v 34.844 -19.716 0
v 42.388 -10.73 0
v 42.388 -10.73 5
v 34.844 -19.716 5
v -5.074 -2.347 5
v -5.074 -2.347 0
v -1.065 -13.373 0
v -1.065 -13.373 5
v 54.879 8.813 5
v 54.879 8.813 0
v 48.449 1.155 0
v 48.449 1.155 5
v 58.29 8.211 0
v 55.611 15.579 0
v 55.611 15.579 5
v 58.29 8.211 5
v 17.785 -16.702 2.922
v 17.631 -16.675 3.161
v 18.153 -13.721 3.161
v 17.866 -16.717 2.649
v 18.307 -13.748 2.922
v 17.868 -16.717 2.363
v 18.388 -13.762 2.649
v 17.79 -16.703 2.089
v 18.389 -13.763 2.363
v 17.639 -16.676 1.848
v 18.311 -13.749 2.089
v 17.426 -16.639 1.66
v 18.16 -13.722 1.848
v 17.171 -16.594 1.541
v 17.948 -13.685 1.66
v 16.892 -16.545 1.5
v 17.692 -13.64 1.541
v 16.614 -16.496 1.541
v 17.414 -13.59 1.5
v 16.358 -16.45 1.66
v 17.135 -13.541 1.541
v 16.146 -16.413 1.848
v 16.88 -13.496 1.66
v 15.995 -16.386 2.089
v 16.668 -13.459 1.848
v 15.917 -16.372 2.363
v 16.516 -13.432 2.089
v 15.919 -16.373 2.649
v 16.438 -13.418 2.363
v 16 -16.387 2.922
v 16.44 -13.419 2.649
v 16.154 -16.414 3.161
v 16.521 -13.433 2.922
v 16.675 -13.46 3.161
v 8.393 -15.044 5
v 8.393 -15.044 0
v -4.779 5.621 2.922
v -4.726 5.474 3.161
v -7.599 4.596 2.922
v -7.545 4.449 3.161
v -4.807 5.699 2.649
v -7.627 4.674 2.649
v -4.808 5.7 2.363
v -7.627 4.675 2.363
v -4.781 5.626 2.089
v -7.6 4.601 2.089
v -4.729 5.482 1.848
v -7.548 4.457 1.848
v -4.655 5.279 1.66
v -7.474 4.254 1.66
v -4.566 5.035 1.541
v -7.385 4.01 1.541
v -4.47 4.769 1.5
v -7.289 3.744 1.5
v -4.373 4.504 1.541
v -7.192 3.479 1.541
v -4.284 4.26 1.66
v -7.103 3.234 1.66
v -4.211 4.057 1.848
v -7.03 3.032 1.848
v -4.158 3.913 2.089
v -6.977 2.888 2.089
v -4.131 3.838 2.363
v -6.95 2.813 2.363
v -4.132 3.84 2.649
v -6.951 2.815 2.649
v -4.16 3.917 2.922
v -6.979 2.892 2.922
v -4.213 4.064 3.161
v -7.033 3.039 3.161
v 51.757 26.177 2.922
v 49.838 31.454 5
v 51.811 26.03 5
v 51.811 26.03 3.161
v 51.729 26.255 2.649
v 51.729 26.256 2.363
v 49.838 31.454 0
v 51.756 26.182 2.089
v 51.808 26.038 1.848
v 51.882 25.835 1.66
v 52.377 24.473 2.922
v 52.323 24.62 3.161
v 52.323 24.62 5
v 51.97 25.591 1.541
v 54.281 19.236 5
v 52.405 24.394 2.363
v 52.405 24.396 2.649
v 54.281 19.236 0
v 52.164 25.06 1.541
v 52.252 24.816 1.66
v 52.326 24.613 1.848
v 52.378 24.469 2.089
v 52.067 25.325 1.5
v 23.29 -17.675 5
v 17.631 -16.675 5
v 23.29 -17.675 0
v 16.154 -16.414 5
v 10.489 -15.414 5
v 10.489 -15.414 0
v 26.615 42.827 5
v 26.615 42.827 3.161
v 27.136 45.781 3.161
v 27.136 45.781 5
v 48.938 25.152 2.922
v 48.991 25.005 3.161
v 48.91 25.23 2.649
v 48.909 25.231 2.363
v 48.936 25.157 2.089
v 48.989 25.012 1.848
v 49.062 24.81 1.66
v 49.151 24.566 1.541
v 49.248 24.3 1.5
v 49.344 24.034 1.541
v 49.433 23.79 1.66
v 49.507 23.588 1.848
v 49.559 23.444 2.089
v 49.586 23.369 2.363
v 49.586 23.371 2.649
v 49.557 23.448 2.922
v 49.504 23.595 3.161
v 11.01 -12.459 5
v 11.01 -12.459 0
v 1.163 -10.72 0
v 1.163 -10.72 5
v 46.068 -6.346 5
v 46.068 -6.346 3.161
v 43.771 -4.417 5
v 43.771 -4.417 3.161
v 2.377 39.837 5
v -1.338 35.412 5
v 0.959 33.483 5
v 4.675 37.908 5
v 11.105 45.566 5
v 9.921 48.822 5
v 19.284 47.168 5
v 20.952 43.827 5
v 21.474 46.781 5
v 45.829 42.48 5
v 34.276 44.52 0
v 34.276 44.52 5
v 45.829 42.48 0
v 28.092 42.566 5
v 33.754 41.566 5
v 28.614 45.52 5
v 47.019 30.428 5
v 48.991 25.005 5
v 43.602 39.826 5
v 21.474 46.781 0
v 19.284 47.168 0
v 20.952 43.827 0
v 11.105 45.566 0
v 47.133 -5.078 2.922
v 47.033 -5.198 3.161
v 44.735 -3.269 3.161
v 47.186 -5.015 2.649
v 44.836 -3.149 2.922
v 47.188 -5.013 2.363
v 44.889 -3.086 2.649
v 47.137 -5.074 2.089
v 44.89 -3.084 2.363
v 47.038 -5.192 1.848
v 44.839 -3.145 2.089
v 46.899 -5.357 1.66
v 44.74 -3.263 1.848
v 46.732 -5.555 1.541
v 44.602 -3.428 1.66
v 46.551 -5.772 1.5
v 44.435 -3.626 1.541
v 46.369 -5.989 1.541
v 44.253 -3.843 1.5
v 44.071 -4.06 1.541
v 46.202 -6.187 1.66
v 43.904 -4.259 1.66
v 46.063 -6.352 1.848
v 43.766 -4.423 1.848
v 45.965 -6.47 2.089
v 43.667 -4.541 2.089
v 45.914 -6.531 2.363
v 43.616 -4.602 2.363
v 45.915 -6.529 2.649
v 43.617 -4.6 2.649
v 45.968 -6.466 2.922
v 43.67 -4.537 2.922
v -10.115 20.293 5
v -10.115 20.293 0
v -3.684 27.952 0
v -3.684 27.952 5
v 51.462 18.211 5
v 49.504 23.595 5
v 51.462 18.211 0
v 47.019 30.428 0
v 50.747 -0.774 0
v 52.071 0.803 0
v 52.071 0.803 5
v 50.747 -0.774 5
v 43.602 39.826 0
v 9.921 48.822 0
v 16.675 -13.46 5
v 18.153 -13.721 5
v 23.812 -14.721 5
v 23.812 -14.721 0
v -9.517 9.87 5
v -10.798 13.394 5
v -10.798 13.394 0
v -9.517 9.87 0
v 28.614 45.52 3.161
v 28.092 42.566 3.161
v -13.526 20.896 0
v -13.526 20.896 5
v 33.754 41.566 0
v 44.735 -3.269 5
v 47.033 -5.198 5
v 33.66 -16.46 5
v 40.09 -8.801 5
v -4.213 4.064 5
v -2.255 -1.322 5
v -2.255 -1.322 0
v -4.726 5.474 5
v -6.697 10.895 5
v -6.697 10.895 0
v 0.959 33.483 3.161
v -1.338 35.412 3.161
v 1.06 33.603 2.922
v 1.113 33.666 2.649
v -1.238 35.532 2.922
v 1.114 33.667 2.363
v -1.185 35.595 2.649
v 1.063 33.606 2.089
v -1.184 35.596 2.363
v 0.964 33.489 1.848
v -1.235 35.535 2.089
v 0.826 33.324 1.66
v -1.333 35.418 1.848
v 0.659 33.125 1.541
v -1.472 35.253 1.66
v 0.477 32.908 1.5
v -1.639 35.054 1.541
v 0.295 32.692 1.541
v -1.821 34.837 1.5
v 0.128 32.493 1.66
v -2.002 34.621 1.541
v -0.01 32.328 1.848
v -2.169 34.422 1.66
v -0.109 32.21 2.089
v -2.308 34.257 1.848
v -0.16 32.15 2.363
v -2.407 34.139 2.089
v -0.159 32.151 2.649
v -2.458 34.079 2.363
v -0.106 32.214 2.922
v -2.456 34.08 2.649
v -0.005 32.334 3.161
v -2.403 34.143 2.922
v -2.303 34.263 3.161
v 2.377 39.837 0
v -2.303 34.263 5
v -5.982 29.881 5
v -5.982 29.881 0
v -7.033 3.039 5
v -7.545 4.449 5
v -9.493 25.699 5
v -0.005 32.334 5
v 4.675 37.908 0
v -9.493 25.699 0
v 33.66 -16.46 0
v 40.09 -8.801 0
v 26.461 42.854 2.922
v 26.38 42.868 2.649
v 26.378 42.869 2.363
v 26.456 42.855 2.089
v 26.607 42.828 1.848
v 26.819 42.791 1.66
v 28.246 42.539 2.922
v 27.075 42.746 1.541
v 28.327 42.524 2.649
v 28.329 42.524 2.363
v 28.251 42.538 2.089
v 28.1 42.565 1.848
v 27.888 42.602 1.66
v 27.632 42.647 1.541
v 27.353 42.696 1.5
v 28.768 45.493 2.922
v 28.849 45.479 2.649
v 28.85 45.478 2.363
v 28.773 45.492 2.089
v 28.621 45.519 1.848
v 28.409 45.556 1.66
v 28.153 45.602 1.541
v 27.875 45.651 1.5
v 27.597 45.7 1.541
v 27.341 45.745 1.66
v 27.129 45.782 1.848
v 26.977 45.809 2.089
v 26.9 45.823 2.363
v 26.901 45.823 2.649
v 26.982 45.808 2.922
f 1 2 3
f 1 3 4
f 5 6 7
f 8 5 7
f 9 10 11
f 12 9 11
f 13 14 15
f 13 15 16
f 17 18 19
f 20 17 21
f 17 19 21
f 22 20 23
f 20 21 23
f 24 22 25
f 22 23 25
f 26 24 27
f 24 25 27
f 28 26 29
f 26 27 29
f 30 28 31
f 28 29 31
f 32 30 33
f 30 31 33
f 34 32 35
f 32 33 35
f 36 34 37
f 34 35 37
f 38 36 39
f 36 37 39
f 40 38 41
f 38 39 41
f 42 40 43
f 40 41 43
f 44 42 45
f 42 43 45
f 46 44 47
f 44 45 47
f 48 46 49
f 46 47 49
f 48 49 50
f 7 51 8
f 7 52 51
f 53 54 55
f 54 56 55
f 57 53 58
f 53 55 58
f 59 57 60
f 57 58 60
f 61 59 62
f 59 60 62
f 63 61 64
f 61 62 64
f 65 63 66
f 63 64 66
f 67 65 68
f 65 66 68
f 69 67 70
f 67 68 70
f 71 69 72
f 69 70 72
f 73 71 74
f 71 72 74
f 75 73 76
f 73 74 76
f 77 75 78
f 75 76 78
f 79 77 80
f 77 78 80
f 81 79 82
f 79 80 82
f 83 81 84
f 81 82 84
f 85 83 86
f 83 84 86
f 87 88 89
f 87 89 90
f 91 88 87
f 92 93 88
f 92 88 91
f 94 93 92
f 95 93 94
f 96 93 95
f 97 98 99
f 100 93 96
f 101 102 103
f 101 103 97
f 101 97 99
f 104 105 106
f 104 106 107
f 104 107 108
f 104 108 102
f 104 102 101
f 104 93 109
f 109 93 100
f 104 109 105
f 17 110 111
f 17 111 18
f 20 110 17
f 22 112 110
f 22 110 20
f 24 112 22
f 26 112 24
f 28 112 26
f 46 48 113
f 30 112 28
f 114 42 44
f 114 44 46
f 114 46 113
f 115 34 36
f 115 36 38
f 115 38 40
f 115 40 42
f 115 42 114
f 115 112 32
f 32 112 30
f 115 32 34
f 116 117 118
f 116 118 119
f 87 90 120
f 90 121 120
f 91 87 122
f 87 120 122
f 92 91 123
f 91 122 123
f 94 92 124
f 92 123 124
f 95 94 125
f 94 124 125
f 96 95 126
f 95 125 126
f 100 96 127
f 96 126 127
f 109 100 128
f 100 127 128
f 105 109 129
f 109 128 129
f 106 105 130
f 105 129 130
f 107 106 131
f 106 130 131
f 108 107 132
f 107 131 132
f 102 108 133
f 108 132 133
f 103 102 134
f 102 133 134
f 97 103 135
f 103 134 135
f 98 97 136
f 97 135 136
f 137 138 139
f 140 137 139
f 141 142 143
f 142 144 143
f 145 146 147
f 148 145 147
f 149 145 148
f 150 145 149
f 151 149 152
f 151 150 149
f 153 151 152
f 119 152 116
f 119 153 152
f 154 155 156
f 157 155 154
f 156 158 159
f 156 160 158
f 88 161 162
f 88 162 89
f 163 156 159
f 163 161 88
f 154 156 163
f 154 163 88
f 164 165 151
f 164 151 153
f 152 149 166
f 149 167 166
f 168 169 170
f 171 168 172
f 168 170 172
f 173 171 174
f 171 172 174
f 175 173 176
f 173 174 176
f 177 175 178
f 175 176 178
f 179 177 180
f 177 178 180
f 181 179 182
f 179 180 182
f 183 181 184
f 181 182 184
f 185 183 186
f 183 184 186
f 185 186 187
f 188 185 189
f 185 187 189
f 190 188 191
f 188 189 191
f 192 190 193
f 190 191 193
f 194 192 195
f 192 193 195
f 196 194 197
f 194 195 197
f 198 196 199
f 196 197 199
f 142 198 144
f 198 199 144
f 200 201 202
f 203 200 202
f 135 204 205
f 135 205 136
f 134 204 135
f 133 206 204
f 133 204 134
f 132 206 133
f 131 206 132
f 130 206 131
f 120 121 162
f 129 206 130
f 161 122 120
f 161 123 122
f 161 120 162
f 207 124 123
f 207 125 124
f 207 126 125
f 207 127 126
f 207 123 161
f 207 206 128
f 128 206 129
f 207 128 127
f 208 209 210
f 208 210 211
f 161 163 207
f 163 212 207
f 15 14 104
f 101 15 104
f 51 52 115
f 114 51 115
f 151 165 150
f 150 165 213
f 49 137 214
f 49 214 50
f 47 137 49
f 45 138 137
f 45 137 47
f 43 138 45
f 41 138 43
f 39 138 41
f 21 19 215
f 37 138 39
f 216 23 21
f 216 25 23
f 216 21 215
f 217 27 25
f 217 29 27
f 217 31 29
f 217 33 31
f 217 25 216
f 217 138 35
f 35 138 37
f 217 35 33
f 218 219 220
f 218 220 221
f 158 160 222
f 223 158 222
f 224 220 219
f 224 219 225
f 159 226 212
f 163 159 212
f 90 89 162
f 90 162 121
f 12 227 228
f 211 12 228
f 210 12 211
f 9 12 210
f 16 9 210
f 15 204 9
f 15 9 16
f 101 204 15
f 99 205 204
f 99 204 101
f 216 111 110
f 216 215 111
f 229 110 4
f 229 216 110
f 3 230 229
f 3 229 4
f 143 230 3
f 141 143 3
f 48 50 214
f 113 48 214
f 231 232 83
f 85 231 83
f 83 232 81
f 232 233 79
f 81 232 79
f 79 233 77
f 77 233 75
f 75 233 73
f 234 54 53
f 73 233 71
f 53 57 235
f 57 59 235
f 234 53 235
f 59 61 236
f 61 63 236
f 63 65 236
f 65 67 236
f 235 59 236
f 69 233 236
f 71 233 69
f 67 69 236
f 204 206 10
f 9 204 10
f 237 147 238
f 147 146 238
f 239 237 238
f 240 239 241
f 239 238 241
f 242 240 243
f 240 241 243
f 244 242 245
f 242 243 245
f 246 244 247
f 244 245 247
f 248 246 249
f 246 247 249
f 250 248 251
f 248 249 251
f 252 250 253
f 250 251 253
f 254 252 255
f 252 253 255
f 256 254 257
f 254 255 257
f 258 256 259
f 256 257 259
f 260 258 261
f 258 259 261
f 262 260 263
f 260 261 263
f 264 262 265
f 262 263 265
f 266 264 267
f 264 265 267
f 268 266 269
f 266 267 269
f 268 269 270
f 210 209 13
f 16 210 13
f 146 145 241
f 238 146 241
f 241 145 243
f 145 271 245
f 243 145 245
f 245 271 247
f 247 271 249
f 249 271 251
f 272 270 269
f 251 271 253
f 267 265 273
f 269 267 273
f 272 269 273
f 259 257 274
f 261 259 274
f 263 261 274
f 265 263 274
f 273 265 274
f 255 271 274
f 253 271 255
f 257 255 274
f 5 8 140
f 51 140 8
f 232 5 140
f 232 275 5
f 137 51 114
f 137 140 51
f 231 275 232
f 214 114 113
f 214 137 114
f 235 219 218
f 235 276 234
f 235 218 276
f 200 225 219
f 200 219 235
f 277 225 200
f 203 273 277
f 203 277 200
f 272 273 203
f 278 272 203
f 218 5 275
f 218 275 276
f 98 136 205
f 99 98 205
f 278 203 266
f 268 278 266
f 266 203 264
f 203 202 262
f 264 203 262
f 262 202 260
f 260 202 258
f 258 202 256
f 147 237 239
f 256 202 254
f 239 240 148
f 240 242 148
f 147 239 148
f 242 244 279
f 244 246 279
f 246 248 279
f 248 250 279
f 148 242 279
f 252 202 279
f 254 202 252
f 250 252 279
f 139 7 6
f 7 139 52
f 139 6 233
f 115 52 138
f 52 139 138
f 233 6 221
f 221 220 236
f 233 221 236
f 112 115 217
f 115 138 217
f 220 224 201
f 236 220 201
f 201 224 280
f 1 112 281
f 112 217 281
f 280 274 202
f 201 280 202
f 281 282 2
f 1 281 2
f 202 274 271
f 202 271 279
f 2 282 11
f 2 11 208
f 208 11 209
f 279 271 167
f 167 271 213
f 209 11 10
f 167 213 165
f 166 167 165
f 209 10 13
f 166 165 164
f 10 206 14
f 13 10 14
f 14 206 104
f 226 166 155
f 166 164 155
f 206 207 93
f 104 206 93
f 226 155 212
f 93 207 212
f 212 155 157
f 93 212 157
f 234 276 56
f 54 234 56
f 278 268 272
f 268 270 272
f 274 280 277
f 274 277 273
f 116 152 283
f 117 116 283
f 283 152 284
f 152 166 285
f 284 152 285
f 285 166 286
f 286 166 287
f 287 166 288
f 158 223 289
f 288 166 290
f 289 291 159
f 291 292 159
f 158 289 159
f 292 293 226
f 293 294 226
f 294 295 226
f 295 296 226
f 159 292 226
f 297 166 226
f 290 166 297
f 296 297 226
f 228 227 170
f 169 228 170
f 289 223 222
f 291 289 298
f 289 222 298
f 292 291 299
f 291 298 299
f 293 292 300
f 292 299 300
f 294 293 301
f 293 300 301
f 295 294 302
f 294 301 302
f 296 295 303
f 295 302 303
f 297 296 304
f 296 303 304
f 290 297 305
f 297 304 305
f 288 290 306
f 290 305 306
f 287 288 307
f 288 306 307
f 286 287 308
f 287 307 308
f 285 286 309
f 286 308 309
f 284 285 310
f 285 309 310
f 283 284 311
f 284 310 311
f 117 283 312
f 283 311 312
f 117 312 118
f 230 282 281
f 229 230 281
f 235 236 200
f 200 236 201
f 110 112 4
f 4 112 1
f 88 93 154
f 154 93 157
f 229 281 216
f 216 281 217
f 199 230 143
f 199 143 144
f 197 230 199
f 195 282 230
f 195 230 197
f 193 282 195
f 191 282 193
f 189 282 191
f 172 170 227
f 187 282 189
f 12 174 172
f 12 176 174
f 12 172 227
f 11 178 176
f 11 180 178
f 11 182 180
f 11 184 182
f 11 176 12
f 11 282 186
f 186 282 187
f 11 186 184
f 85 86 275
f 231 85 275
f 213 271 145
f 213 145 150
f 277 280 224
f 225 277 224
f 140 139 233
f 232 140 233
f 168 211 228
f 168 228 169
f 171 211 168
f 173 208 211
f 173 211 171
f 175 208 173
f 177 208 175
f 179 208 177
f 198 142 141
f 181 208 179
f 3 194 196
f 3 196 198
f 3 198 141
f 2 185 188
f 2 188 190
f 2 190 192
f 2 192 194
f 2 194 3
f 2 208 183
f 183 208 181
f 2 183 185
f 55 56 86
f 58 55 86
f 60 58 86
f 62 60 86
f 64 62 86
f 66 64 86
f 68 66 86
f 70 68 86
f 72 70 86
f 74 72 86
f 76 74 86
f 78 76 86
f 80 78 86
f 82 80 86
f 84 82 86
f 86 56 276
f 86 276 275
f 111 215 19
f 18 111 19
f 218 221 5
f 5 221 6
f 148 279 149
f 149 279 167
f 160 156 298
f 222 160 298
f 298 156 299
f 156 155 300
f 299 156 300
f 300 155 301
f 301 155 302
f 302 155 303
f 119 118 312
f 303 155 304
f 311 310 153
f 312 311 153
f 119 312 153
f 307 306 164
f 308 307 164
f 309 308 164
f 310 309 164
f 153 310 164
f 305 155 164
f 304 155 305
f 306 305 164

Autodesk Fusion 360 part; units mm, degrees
sketch "Sketch1" plane through (0, 0, 0) normal (0, 0, 1) x (1, 0, 0)
  line L0 (-10.798, 13.3938) -> (-13.526, 20.8958)
  line L1 (-9.4934, 25.6987) -> (-13.526, 20.8958)
  line L2 (19.2845, 47.1681) -> (9.9209, 48.822)
  line L3 (55.6112, 15.5789) -> (58.2905, 8.2107)
  line L4 (52.0708, 0.8027) -> (58.2905, 8.2107)
  line L5 (8.3931, -15.0435) -> (-1.0646, -13.373)
  line L6 (-10.798, 13.3938) -> (-9.5166, 9.87)
  line L7 (-5.074, -2.3473) -> (-1.0646, -13.373)
  line L8 (1.1628, -10.72) -> (-2.2546, -1.322)
  line L9 (-6.6972, 10.8953) -> (-10.1147, 20.2932)
  line L10 (33.6598, -16.4599) -> (23.8122, -14.7206)
  line L11 (11.0104, -12.4594) -> (1.1628, -10.72)
  line L12 (8.3931, -15.0435) -> (10.4886, -15.4136)
  line L13 (23.2904, -17.6748) -> (34.8436, -19.7155)
  line L14 (54.8793, 8.8133) -> (48.4491, 1.1547)
  line L15 (40.0899, -8.8014) -> (33.6598, -16.4599)
  line L16 (52.0708, 0.8027) -> (50.7467, -0.7743)
  line L17 (42.3875, -10.7304) -> (34.8436, -19.7155)
  line L18 (43.6017, 39.8265) -> (47.0192, 30.4285)
  line L19 (51.4618, 18.2112) -> (54.8793, 8.8133)
  line L20 (55.6112, 15.5789) -> (54.2812, 19.2364)
  line L21 (49.8385, 31.4537) -> (45.8292, 42.4795)
  line L22 (11.1048, 45.5664) -> (20.9523, 43.827)
  line L23 (33.7542, 41.5658) -> (43.6017, 39.8265)
  line L24 (19.2845, 47.1681) -> (21.4741, 46.7813)
  line L25 (34.276, 44.5201) -> (45.8292, 42.4795)
  line L26 (-10.1147, 20.2932) -> (-3.6845, 27.9518)
  line L27 (4.6746, 37.9079) -> (11.1048, 45.5664)
  line L28 (-9.4934, 25.6987) -> (-5.9821, 29.8808)
  line L29 (2.3771, 39.8369) -> (9.9209, 48.822)
  line L30 (50.7467, -0.7743) -> (42.3875, -10.7304)
  line L31 (40.0899, -8.8014) -> (48.4491, 1.1547)
  line L32 (23.2904, -17.6748) -> (10.4886, -15.4136)
  line L33 (11.0104, -12.4594) -> (23.8122, -14.7206)
  line L34 (-2.2546, -1.322) -> (-6.6972, 10.8953)
  line L35 (-9.5166, 9.87) -> (-5.074, -2.3473)
  line L36 (-3.6845, 27.9518) -> (4.6746, 37.9079)
  line L37 (2.3771, 39.8369) -> (-5.9821, 29.8808)
  line L38 (20.9523, 43.827) -> (33.7542, 41.5658)
  line L39 (34.276, 44.5201) -> (21.4741, 46.7813)
  line L40 (49.8385, 31.4537) -> (54.2812, 19.2364)
  line L41 (51.4618, 18.2112) -> (47.0192, 30.4285)
extrude "Extrude1" add sketch "Sketch1" along normal blind 5
sketch "Sketch2" plane through (8.6627, 49.0442, 0) normal (0.1739, 0.9848, 0) x (-0.9848, 0.1739, 0)
  line L0 (-37.7418, 0) -> (-1.2777, 0)
  line L1 (-1.2777, 0) -> (-1.2777, 5)
  line L2 (-1.2777, 5) -> (-37.7418, 5)
  line L3 (-37.7418, 5) -> (-37.7418, 0)
  line L4 (-20.2597, 5) -> (-20.2597, 3.1614)
  line L5 (-18.7597, 3.1614) -> (-18.7597, 5)
  arc A0 (-20.2597, 3.1614) -> (-18.7597, 3.1614) centre (-19.5097, 2.5) ccw
  arc A1 (-19.3816, 3.4918) -> (-19.5097, 3.5) centre (-19.5097, 2.5) ccw
  line L6 (-20.2597, 5) -> (-18.7597, 5)
  arc A2 (-20.2597, 3.1614) -> (-18.7597, 3.1614) centre (-19.5097, 2.5) ccw
  line L7 (-18.7597, 3.1614) -> (-18.7597, 5)
  line L8 (-20.2597, 5) -> (-20.2597, 3.1614)
  line L9 (-20.2597, 5) -> (-18.7597, 5)
  arc A3 (-20.2597, 3.1614) -> (-18.7597, 3.1614) centre (-19.5097, 2.5) ccw
  line L10 (-18.7597, 3.1614) -> (-18.7597, 5)
  line L11 (-20.2597, 5) -> (-20.2597, 3.1614)
  line L12 (-20.2597, 5) -> (-18.7597, 5)
  point P0 (-19.5097, 2.5)
  dimension "d30" = 2
  dimension "d34" = 2
  dimension "d35" = 2
sketch "Sketch3" plane through (-18.2237, 15.3006, 0) normal (-0.7659, 0.643, 0) x (-0.643, -0.7659, 0)
  line L0 (-43.7698, 0) -> (-7.3057, 0)
  line L1 (-7.3057, 0) -> (-7.3057, 5)
  line L2 (-7.3057, 5) -> (-43.7698, 5)
  line L3 (-43.7698, 5) -> (-43.7698, 0)
  arc A0 (-26.2597, 3.1614) -> (-24.7597, 3.1614) centre (-25.5097, 2.5) ccw
  line L4 (-24.7597, 3.1614) -> (-24.7597, 5)
  line L5 (-26.2597, 5) -> (-26.2597, 3.1614)
  line L6 (-26.2597, 5) -> (-24.7597, 5)
  dimension "d36" = 2
sketch "Sketch4" plane through (-5.2353, -1.9037, 0) normal (-0.9398, -0.3417, 0) x (0.3417, -0.9398, 0)
  line L0 (-24.2601, 0) -> (12.204, 0)
  line L1 (12.204, 0) -> (12.204, 5)
  line L2 (12.204, 5) -> (-24.2601, 5)
  line L3 (-24.2601, 5) -> (-24.2601, 0)
  arc A0 (-6.7597, 3.1614) -> (-5.2597, 3.1614) centre (-6.0097, 2.5) ccw
  line L4 (-5.2597, 3.1614) -> (-5.2597, 5)
  line L5 (-6.7597, 5) -> (-6.7597, 3.1614)
  line L6 (-6.7597, 5) -> (-5.2597, 5)
  dimension "d39" = 2
extrude "Extrude5" cut sketch "Sketch2" against normal blind 69 contours L2 L4 L5 A0 L6 A2 L7 L8 L9 A3 L10 L11 L12
extrude "Extrude6" cut sketch "Sketch3" against normal blind 67 contours L2 A0 L4 L5 L6
extrude "Extrude7" cut sketch "Sketch4" against normal blind 67 contours L2 A0 L4 L5 L6
